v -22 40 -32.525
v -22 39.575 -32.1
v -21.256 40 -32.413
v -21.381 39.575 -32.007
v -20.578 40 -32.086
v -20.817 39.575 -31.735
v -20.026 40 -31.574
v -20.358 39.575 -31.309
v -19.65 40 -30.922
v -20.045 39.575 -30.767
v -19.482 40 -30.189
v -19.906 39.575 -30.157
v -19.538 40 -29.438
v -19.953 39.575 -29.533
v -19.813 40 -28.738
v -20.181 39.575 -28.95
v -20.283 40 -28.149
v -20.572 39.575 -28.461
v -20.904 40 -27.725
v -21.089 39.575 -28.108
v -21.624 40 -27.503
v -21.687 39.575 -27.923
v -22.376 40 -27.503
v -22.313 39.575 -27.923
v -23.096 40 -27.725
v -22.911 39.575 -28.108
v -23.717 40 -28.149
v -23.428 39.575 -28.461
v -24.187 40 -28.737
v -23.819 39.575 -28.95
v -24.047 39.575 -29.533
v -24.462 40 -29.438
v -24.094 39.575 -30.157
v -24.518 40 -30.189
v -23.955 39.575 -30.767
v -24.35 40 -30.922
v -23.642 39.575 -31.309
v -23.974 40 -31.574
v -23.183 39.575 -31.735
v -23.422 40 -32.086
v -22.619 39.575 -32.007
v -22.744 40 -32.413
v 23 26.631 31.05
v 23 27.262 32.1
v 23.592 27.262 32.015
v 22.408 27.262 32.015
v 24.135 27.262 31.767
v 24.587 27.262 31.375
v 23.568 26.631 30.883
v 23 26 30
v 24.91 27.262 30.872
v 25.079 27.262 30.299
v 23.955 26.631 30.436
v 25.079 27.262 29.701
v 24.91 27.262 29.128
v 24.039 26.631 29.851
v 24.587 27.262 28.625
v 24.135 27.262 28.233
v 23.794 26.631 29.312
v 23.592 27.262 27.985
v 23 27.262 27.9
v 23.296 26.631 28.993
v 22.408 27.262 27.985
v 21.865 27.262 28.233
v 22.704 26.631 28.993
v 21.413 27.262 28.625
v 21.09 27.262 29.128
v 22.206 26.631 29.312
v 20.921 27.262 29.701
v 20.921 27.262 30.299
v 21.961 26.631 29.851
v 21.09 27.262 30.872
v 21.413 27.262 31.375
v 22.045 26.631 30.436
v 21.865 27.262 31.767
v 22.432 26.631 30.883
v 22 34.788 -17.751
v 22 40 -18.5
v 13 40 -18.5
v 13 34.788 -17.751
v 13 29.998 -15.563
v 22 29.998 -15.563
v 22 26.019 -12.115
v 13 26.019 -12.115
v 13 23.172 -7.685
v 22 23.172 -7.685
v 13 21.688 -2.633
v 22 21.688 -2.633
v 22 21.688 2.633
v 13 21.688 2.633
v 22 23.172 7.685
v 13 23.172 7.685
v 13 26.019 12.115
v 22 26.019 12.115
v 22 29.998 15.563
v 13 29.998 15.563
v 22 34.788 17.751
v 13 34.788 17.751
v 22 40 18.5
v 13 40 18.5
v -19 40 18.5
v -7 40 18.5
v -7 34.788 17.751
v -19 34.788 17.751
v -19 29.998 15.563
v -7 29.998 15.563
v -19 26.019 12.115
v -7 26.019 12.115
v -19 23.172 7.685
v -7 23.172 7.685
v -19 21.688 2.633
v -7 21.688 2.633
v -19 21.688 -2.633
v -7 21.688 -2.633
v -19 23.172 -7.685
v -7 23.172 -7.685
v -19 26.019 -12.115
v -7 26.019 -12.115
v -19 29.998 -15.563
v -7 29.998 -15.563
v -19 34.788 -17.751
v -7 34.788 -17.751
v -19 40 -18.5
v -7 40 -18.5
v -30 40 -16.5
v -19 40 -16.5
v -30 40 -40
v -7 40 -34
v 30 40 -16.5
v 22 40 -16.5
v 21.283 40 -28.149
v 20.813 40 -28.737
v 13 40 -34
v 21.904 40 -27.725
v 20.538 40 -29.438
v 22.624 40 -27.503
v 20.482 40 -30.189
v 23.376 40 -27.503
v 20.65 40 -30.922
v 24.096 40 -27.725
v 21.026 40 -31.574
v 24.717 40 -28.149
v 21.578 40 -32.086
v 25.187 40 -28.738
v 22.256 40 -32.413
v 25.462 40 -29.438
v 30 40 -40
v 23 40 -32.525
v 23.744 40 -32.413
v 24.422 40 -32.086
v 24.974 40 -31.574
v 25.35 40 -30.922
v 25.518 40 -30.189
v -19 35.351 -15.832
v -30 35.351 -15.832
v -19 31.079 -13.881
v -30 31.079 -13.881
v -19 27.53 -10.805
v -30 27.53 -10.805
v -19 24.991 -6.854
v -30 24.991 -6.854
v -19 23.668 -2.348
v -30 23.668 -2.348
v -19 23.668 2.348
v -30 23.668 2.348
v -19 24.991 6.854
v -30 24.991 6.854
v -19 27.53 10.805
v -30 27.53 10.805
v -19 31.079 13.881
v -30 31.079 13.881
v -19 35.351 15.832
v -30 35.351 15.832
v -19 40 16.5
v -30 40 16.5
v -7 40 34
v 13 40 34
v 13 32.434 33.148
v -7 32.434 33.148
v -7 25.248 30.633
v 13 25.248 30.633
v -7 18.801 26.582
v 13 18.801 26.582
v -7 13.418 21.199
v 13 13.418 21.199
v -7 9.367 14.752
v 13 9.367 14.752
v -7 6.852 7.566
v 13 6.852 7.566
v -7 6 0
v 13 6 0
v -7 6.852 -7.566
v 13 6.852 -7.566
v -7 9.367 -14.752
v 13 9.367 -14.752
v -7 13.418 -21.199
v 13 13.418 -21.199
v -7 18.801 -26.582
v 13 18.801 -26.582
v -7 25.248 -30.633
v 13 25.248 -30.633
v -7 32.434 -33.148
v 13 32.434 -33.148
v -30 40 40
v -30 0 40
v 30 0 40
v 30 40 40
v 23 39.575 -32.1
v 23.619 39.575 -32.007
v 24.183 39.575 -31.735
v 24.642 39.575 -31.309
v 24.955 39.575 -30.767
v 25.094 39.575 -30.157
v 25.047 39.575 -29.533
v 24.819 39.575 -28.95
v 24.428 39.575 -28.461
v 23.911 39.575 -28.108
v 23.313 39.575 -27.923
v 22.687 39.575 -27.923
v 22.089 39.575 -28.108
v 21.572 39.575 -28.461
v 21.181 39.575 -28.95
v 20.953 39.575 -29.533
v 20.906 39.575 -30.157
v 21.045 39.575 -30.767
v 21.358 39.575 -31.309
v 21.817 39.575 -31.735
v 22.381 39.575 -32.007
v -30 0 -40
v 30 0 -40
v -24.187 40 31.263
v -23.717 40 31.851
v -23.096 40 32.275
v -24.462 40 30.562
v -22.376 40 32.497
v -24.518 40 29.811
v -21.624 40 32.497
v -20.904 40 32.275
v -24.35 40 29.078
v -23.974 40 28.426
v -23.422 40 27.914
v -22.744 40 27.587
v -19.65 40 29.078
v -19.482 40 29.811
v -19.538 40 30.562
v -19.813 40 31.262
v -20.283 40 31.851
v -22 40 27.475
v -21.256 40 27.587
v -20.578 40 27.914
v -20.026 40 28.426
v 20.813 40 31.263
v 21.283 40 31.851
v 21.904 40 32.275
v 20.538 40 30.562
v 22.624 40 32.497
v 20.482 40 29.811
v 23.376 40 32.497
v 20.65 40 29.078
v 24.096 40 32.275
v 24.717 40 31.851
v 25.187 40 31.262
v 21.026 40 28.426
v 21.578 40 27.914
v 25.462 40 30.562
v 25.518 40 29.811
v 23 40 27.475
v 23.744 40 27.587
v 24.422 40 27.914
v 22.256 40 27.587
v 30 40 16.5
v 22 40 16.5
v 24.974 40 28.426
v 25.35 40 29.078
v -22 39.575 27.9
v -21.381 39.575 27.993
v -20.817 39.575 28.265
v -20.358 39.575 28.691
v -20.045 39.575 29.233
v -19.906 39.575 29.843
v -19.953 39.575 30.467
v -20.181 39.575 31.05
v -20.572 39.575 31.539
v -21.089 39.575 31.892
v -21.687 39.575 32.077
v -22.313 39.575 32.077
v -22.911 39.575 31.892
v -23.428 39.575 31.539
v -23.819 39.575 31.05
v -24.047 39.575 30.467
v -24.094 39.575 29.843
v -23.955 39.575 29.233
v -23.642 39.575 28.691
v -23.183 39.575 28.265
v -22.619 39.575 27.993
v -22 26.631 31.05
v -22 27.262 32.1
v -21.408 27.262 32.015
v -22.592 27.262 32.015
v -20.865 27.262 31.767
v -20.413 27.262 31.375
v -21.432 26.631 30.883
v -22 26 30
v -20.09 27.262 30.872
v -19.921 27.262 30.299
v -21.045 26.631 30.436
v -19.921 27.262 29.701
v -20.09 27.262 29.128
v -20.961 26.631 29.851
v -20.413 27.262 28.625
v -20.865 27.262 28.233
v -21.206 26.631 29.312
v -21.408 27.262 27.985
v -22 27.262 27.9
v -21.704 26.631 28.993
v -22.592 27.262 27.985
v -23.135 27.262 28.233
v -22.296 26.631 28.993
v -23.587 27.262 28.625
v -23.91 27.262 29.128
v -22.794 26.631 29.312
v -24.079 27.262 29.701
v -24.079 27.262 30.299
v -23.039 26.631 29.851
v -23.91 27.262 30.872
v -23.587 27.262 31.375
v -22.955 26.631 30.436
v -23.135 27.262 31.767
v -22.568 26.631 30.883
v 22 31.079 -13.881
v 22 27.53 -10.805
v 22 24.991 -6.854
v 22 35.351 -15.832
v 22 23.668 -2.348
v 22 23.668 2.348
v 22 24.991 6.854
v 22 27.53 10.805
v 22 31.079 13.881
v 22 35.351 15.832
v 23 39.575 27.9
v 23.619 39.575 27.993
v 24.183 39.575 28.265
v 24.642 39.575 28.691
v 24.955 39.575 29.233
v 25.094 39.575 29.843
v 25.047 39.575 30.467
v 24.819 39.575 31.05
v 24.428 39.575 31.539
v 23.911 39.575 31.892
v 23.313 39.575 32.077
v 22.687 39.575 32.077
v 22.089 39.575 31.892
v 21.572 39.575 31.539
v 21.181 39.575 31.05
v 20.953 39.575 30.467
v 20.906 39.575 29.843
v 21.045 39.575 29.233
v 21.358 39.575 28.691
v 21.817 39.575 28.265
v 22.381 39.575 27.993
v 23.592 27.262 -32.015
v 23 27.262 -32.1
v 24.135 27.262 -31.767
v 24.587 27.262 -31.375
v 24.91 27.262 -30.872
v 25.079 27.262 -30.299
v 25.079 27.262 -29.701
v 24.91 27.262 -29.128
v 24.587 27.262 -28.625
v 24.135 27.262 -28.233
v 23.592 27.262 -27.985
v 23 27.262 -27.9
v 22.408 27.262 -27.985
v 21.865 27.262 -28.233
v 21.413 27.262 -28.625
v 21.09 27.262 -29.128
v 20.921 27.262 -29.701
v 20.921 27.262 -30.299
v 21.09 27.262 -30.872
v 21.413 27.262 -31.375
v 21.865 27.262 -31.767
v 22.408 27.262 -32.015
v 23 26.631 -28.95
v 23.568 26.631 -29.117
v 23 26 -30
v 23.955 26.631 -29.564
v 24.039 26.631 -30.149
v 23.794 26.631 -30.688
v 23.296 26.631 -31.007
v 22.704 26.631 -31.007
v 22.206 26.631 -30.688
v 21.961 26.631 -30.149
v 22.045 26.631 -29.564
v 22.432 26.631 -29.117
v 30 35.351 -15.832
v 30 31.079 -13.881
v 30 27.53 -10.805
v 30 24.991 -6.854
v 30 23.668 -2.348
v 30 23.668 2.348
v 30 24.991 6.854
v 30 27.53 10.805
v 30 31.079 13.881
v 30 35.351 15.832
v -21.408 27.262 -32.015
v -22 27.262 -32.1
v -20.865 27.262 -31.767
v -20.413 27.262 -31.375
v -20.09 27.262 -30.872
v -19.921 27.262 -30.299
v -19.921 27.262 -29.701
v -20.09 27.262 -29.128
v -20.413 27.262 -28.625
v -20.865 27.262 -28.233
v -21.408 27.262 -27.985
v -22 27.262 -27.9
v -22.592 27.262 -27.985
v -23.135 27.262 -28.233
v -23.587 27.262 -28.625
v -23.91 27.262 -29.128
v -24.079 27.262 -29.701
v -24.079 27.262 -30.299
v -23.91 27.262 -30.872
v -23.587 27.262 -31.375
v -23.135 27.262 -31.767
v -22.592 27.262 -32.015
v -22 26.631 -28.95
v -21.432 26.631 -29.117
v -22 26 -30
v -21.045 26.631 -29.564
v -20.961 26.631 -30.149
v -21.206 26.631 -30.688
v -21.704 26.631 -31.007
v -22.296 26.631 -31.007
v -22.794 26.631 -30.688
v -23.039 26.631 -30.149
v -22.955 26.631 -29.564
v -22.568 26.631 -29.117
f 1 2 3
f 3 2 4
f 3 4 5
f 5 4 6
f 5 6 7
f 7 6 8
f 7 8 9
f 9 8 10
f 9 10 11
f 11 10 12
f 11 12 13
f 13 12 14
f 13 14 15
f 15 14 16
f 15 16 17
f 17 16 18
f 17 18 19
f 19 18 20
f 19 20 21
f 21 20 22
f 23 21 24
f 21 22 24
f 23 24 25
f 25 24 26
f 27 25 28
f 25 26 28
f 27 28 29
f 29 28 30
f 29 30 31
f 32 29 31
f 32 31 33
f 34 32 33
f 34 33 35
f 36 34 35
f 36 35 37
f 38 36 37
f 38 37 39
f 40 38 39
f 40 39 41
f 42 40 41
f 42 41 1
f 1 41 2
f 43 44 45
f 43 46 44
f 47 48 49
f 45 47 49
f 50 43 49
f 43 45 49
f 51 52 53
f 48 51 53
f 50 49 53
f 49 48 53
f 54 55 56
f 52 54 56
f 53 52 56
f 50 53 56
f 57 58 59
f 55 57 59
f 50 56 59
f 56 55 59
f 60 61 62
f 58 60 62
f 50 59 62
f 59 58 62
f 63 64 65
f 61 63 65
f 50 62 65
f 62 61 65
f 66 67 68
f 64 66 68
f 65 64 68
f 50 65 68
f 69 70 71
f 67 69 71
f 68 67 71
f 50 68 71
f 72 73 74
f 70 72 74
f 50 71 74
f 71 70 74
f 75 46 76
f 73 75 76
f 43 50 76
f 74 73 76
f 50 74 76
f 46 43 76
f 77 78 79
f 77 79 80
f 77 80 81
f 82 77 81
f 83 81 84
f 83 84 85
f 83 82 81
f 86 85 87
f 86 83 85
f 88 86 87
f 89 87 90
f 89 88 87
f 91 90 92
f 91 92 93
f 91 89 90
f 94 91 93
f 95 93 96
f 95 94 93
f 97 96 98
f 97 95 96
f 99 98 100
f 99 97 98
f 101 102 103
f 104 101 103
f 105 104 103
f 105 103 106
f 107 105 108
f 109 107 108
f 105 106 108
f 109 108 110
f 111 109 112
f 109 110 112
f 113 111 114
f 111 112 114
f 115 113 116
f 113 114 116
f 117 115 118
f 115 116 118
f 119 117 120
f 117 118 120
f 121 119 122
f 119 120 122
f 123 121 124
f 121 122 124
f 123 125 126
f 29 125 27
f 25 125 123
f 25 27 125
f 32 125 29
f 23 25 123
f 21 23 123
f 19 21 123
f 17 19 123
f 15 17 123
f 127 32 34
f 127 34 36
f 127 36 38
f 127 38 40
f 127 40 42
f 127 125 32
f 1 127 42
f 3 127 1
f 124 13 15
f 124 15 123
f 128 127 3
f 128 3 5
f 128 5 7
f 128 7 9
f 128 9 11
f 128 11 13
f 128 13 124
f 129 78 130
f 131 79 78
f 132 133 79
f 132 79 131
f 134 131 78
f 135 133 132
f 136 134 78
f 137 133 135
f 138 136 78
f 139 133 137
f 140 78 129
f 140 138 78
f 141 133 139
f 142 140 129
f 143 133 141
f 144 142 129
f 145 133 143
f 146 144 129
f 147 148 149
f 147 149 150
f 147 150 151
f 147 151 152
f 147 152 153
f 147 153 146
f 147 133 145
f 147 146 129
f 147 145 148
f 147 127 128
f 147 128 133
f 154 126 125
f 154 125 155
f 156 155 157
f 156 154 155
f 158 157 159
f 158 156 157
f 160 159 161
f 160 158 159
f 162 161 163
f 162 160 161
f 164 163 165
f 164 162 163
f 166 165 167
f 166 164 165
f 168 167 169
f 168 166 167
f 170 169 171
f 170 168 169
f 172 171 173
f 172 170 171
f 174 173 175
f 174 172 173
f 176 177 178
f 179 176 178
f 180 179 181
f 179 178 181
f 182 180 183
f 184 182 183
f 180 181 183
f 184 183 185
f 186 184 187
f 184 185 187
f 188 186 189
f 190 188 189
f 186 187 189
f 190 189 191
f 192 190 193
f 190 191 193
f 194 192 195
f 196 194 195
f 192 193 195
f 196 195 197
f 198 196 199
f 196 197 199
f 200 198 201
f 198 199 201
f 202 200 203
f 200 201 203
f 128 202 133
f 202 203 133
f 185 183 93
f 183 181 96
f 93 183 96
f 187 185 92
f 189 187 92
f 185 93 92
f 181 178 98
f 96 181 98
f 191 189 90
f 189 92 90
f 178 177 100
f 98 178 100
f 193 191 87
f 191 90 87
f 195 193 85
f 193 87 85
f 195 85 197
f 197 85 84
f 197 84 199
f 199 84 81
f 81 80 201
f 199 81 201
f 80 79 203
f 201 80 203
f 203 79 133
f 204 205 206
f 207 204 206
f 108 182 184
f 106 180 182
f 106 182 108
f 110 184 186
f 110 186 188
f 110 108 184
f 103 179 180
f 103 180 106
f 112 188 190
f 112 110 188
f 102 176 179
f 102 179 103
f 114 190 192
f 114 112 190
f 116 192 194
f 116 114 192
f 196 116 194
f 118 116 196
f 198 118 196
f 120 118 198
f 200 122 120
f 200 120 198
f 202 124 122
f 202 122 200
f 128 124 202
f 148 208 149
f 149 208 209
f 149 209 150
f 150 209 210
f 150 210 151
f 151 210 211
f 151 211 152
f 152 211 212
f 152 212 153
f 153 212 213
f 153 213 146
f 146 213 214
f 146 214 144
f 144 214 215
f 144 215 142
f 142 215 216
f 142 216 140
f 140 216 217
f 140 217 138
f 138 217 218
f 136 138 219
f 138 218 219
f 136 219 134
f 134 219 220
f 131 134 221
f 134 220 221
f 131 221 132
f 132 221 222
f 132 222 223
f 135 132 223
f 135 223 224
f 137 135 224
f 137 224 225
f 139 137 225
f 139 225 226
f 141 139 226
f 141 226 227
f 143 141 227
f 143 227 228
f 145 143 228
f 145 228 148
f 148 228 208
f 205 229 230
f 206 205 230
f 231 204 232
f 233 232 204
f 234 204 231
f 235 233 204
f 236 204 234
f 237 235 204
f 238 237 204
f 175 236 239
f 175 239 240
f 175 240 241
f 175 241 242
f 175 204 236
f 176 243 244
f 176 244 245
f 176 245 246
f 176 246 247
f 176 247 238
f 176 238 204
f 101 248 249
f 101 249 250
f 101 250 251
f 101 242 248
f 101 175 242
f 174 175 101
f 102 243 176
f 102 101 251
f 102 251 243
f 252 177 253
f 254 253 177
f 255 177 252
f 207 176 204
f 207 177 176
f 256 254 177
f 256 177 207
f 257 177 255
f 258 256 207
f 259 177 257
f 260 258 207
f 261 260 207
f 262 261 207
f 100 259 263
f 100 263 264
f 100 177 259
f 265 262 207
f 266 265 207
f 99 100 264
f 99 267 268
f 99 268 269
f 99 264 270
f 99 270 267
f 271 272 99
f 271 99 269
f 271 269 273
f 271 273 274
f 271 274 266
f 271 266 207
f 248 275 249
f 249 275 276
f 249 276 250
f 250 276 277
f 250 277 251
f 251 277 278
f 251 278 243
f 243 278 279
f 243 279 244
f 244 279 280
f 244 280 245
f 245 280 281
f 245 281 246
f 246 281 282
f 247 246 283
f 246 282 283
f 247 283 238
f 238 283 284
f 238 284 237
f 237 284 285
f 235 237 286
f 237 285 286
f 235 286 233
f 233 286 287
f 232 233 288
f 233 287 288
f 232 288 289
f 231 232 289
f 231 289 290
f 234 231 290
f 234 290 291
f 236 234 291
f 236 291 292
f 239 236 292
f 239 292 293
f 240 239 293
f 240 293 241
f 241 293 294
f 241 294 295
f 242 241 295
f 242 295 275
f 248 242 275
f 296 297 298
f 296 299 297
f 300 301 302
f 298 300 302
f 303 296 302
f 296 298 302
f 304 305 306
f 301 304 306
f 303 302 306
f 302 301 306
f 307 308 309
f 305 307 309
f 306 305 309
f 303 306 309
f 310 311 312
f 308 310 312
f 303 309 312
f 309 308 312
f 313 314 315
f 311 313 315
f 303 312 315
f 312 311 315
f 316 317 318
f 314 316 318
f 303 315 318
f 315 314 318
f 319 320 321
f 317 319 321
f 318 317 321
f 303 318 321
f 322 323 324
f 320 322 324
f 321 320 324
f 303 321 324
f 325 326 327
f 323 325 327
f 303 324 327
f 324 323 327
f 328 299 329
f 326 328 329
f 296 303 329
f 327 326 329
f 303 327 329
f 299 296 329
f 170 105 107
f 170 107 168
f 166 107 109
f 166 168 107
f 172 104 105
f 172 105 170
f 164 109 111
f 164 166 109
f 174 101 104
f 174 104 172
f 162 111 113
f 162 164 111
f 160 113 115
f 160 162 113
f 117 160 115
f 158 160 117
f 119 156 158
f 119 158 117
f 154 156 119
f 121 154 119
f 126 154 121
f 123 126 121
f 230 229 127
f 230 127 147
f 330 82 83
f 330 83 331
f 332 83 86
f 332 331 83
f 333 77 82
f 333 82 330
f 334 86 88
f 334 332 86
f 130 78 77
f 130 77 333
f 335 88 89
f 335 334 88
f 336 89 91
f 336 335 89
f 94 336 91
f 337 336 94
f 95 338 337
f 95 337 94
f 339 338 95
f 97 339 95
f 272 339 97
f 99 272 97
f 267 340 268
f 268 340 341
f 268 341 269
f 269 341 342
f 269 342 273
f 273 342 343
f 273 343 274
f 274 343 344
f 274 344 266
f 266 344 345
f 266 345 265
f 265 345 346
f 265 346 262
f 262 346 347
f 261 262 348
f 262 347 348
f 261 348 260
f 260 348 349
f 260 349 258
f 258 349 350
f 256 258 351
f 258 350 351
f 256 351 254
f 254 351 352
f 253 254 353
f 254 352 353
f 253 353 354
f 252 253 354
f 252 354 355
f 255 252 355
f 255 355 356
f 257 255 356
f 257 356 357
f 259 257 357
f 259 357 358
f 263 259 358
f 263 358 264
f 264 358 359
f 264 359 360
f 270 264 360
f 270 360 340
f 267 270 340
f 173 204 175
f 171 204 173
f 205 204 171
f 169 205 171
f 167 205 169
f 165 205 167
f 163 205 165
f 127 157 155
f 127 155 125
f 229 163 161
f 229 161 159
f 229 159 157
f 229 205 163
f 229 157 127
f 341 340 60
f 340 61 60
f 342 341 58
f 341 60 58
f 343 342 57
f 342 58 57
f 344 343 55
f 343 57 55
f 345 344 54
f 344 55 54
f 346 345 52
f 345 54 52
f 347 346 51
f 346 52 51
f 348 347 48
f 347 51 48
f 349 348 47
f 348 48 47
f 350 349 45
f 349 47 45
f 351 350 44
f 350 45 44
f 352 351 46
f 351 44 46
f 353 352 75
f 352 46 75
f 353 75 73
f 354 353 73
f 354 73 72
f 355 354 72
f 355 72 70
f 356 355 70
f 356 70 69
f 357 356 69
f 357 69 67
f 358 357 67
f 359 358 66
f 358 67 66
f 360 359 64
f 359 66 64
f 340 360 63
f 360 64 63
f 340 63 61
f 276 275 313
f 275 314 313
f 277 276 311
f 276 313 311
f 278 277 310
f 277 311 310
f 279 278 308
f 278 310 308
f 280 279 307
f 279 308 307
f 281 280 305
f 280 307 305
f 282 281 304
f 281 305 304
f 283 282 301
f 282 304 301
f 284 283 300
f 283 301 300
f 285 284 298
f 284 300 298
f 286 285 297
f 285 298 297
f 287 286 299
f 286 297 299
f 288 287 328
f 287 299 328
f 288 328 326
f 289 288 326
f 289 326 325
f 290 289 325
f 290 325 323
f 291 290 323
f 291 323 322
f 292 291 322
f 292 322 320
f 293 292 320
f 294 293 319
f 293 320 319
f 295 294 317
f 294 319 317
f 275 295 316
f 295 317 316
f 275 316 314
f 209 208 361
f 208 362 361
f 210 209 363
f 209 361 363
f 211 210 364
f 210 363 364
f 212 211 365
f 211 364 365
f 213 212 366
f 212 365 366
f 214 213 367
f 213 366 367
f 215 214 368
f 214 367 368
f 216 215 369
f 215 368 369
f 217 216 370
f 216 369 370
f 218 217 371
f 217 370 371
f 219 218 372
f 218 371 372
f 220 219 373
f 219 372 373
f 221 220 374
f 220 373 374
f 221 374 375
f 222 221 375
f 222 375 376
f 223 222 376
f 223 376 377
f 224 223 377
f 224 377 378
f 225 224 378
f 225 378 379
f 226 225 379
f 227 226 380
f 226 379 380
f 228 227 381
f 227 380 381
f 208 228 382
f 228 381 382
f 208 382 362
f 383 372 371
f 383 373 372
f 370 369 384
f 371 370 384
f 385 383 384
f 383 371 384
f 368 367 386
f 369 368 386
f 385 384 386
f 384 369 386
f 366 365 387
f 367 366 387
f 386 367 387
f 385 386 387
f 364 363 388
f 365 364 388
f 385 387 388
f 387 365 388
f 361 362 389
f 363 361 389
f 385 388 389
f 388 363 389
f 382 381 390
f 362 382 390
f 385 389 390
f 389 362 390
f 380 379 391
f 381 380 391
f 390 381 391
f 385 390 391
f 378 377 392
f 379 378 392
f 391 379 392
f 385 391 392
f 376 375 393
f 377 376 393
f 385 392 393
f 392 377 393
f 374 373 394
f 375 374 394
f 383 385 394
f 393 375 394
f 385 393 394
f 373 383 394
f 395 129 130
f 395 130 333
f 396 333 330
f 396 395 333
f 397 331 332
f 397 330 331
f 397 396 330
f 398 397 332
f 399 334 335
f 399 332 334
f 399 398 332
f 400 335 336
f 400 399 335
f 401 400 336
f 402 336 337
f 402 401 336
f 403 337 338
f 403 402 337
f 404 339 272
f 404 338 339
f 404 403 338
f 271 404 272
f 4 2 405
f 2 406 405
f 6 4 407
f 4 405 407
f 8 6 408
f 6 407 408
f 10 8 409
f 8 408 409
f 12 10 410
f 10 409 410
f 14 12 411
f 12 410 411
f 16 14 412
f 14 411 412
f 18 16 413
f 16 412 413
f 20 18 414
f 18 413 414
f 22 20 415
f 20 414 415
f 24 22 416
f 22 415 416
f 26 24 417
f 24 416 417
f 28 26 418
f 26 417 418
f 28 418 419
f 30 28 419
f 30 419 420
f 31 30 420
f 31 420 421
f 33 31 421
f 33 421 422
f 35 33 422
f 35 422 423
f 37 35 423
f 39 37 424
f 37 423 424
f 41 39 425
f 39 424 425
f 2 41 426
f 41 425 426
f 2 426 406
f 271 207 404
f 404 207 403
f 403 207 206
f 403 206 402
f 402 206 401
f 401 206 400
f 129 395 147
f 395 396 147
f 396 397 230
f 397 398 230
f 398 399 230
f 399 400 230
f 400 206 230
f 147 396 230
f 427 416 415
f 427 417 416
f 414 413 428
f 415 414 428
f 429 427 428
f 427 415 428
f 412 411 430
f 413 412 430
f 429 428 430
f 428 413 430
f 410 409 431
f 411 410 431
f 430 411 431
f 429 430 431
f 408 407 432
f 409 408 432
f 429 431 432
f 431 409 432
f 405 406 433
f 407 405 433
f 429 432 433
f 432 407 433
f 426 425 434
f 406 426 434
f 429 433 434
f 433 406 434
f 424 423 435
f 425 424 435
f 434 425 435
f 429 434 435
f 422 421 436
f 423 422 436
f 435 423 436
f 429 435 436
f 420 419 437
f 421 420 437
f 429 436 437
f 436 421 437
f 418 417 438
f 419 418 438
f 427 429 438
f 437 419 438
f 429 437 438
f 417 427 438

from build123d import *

# Parameters (mm, degrees)
SCHIZZO1_W                          = 60
SCHIZZO1_H                          = 80
ESTRUSIONE_ESTRUSIONE1_DEPTH        = 40
TAGLIO_ESTRUSIONE1_REACH            = 84.462
TAGLIO_ESTRUSIONE2_START            = -8
TAGLIO_ESTRUSIONE2_DEPTH            = 9
TAGLIO_ESTRUSIONE3_START            = -23
TAGLIO_ESTRUSIONE3_DEPTH            = 12
TAGLIO_ESTRUSIONE4_START            = -43
TAGLIO_ESTRUSIONE4_DEPTH            = 20
FORO_FILETTATO_M5X0_8_1_D           = 4.2
FORO_FILETTATO_M5X0_8_1_DEPTH       = 12.7381927
FORO_FILETTATO_M5X0_8_1_CSINK_D     = 5.05
FORO_FILETTATO_M5X0_8_1_CSINK_ANGLE = 90
FORO_FILETTATO_M5X0_8_1_TIP         = 1.2618073


with BuildPart() as part:
    # Schizzo1 → Estrusione-Estrusione1 (new body)
    with BuildSketch(Plane(origin=(0, 0, 0), x_dir=(1, 0, 0), z_dir=(0, 1, 0))):
        Rectangle(SCHIZZO1_W, SCHIZZO1_H)
    extrude(amount=ESTRUSIONE_ESTRUSIONE1_DEPTH)

    # Schizzo2 → Taglio-Estrusione1 (cut, up to next)
    with BuildSketch(Plane(origin=(30, 0, 0), x_dir=(0, 0, -1), z_dir=(1, 0, 0)), mode=Mode.PRIVATE) as taglio_estrusione1_sk1:
        with BuildLine():
            Line((-16.5, 40), (16.5, 40))
            ThreePointArc((16.5, 40), (0, 23.5), (-16.5, 40))
        make_face()
    taglio_estrusione1_tool1 = extrude(taglio_estrusione1_sk1.sketch, amount=-TAGLIO_ESTRUSIONE1_REACH, mode=Mode.PRIVATE) & part.part
    add(taglio_estrusione1_tool1.solids().sort_by_distance((30, 32.997183, 0))[0], mode=Mode.SUBTRACT)

    # Schizzo3 → Taglio-Estrusione2 (cut)
    with BuildSketch(Plane(origin=(30, 0, 0), x_dir=(0, 0, -1), z_dir=(1, 0, 0)).offset(TAGLIO_ESTRUSIONE2_START)):
        with BuildLine():
            Line((16.5, 40), (18.5, 40))
            ThreePointArc((18.5, 40), (0, 21.5), (-18.5, 40))
            Line((-18.5, 40), (-16.5, 40))
            ThreePointArc((-16.5, 40), (0, 23.5), (16.5, 40))
        make_face()
    extrude(amount=-TAGLIO_ESTRUSIONE2_DEPTH, mode=Mode.SUBTRACT)

    # Schizzo4 → Taglio-Estrusione3 (cut)
    with BuildSketch(Plane.ZY.offset(30).offset(TAGLIO_ESTRUSIONE3_START)):
        with BuildLine():
            Line((16.5, 40), (18.5, 40))
            ThreePointArc((18.5, 40), (0, 21.5), (-18.5, 40))
            Line((-18.5, 40), (-16.5, 40))
            ThreePointArc((-16.5, 40), (0, 23.5), (16.5, 40))
        make_face()
    extrude(amount=TAGLIO_ESTRUSIONE3_DEPTH, mode=Mode.SUBTRACT)

    # Schizzo5 → Taglio-Estrusione4 (cut)
    with BuildSketch(Plane.ZY.offset(30).offset(TAGLIO_ESTRUSIONE4_START)):
        with BuildLine():
            Line((16.5, 40), (34, 40))
            ThreePointArc((34, 40), (0, 6), (-34, 40))
            Line((-34, 40), (-16.5, 40))
            ThreePointArc((-16.5, 40), (0, 23.5), (16.5, 40))
        make_face()
    extrude(amount=TAGLIO_ESTRUSIONE4_DEPTH, mode=Mode.SUBTRACT)

    # Foro filettato M5x0.8-1
    with Locations(Plane(origin=(-22, 40, -30), x_dir=(0, 0, 1), z_dir=(0, 1, 0))):
        with Locations((0, 0), (0, 45), (60, 0), (60, 45)):
            CounterSinkHole(FORO_FILETTATO_M5X0_8_1_D / 2, FORO_FILETTATO_M5X0_8_1_CSINK_D / 2, depth=FORO_FILETTATO_M5X0_8_1_DEPTH, counter_sink_angle=FORO_FILETTATO_M5X0_8_1_CSINK_ANGLE)
            with Locations((0, 0, -(FORO_FILETTATO_M5X0_8_1_DEPTH + FORO_FILETTATO_M5X0_8_1_TIP / 2))):  # 118° drill point
                Cone(0, FORO_FILETTATO_M5X0_8_1_D / 2, FORO_FILETTATO_M5X0_8_1_TIP, mode=Mode.SUBTRACT)


solid = part.part
